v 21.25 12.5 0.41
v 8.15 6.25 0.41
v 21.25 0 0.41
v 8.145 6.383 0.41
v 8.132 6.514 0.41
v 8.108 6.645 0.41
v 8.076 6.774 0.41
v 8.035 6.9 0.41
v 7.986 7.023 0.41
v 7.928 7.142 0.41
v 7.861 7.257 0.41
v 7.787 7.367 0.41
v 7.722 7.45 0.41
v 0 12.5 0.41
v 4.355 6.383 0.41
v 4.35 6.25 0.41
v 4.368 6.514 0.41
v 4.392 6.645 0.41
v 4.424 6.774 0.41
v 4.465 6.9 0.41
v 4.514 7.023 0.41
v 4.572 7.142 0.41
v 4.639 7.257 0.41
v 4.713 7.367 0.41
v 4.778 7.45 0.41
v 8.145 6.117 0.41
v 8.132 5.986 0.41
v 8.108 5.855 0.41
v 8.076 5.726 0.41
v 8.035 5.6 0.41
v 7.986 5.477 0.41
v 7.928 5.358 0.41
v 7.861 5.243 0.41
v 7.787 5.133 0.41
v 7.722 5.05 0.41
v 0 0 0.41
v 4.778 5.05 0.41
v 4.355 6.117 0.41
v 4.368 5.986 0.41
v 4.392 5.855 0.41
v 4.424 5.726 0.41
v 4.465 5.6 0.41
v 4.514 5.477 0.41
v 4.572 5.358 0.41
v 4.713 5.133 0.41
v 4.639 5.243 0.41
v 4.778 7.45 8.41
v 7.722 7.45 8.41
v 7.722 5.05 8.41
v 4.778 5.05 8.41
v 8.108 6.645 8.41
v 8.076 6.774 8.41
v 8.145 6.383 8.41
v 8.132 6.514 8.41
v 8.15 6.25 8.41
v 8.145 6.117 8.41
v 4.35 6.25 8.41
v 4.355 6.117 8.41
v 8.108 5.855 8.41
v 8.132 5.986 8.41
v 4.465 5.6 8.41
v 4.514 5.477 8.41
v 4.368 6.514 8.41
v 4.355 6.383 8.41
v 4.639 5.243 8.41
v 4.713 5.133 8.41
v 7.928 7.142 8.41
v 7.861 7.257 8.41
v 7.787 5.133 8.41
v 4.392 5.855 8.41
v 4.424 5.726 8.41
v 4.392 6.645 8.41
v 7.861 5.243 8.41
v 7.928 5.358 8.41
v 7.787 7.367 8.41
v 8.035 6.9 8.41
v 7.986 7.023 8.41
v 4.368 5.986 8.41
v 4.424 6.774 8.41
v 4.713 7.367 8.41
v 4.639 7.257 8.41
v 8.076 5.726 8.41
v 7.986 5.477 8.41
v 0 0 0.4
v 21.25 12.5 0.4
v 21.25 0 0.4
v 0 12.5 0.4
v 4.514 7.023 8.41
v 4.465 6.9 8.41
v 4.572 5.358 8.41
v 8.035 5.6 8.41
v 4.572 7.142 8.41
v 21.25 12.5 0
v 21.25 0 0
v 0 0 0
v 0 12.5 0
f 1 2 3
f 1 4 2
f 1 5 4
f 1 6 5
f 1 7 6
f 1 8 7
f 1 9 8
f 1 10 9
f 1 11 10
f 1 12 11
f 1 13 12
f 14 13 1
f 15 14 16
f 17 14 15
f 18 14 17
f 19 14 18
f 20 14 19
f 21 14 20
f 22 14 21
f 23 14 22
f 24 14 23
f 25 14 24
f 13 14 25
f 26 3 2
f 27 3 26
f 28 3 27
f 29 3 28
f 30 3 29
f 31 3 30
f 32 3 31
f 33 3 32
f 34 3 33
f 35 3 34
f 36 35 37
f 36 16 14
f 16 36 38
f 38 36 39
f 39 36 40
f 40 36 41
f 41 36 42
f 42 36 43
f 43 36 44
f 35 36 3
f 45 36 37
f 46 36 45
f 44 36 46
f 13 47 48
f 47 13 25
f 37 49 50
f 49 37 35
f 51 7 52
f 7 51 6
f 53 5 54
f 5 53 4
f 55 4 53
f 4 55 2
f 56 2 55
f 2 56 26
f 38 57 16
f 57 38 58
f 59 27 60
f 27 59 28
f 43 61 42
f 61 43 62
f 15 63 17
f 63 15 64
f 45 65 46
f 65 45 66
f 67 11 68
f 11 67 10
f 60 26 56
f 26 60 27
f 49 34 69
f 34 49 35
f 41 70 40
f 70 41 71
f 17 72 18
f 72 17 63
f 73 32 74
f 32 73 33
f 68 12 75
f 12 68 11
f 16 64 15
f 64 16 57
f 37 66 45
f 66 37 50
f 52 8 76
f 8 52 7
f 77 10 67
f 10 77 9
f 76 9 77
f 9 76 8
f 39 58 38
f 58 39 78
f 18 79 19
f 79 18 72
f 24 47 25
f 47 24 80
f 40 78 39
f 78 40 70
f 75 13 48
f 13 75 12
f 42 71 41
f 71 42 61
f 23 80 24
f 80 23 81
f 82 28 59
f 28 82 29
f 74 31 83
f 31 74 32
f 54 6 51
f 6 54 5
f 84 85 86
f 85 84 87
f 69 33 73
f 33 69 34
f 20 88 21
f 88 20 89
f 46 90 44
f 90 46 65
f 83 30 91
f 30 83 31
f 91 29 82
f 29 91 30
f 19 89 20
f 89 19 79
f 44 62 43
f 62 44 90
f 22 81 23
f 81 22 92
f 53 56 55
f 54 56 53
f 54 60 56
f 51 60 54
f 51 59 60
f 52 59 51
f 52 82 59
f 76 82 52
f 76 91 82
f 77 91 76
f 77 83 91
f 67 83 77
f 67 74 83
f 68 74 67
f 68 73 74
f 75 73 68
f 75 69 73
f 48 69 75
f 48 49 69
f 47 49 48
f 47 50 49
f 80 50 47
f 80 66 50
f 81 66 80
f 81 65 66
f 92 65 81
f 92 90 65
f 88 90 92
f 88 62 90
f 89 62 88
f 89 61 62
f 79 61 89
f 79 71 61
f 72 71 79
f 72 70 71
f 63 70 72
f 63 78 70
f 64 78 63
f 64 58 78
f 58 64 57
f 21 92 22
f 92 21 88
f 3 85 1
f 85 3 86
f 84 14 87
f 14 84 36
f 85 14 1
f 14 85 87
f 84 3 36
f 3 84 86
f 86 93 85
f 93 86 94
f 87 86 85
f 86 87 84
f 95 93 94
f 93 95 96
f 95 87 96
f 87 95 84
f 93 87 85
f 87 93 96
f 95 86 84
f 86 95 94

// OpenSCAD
// file: ../../Base/Boxes.scad
// Fischertechnik Box Foundation
// Pre-designed Boxes

use <Constants.scad>

include <PlacementOptions.scad>

box190Width = 190;
box190Depth = 130;
box130Width = 130;
box130Depth = 95;

// Values are from an original ec3 box
topBottomDifference = 1.5;
outerHeight = 40;
baseThickness = 1.8;
innerHeight = outerHeight - baseThickness;
stackExcess = 5.7;
radius = 3.5;
wallThickness = 1.5;
tolerance = 0.2;

boxWallThickness = wallThickness;
boxBaseThickness = baseThickness;
boxWebWidth = 3.0;

// getBoxWallThickness()
// Gets the wall thickness of a Fischertechnik Box
function getBoxWallThickness() = boxWallThickness;

// getBoxUsageHeight(height = 38.2)
// Gets the usable height of a Fischertechnik box
// height = Outer height of the box from the bottom to the upper edge.
function getBoxUsageHeight(height = outerHeight) = height - baseThickness - stackExcess;

// getBoxInnerHeight()
// Gets the inner height of a Fischertechnik box, including the stack excess
function getBoxInnerHeight() = innerHeight;

// getBoxBaseThickness()
// Gets the thickness of the Fischertechnik box base.
function getBoxBaseThickness() = boxBaseThickness;

// getBoxWebWidth()
// Gets the width of a box web
function getBoxWebWidth() = boxWebWidth;

// getBox190Space()
// Gets the usable inner space of a Box 190 as an x/y-list
function getBox190Space() = [
    box190Width - 2*getBoxWallThickness() - topBottomDifference, 
    box190Depth - 2*getBoxWallThickness() - topBottomDifference ];

// RoundedCornerPlate(width, depth, height, radius)
// Creates a body plate with rounded corners for a box. Used
// also to create the complete box with the hull module.
// width = Width of the plate
// depth = depth of the plate 
// height = thickness of the plate
// radius = radius of the rounded corner
module RoundedCornerPlate(width, depth, height, radius) {
    translate([radius, radius])
    hull() {
        w = width-2*radius;
        d = depth-2*radius;
        cube([w, d, height]);
        cylinder(height, r=radius, $fn=getFragments());
        translate([w, 0])
            cylinder(height, r=radius, $fn=getFragments());
        translate([w, d])
            cylinder(height, r=radius, $fn=getFragments());
        translate([0, d])
            cylinder(height, r=radius, $fn=getFragments());
    }
}

// BoxBase(width, depth)
// Creates an empty stackable Fischertechnik compatible box
// width = Outer width of the box (190, 130, ...)
// depth = Outer depth of the box (130, 95, ...)

module BoxBase(width, depth, height=outerHeight) {    
    thinPlate = 0.01;

    innerHeight = height - baseThickness;    
    
    module Body(tolerance=tolerance) {
        hull() {
            // Bottom with tolerance to fit into the original boxes when stacked
            translate([-wallThickness+tolerance, -wallThickness+tolerance, -baseThickness])
                RoundedCornerPlate(width-topBottomDifference-2*tolerance, depth-topBottomDifference-2*tolerance, thinPlate, radius);
            
            // Top
            translate([-wallThickness-topBottomDifference/2, -wallThickness-topBottomDifference/2, innerHeight-thinPlate])
                RoundedCornerPlate(width, depth, thinPlate, radius);
         }
    }

    module Cutoff() {
        hull() {
            coWidth = width - 2*wallThickness;
            coDepth = depth - 2*wallThickness;
            
            // Bottom
            RoundedCornerPlate(coWidth-topBottomDifference, coDepth-topBottomDifference, thinPlate, radius);

            // Top
            translate([-topBottomDifference/2, -topBottomDifference/2, innerHeight+thinPlate]) 
                RoundedCornerPlate(coWidth, coDepth, thinPlate, radius);
        }
    }
    
    difference() {        
        Body();
        Cutoff();
        stackOffset = innerHeight - stackExcess;
        translate([0, 0, stackOffset + baseThickness])
            Body(tolerance=0);
    }
}

// Creates the Fischertechnik empty box 130x190 mm and places it at position 0,0
// 190x130 are the outer sizes, the inner space is slightly smaller. Use getBox190Space() to get the inner sizes.
// The box is positioned that the usable inner space is at the 0,0,0 position.

module Box190() {
    BoxBase(box190Width, box190Depth);
}

// Gets the usable inner space of a Box 130 as an x/y-list
function getBox130Space() = [
    box130Width - 2*getBoxWallThickness() - topBottomDifference, 
    box130Depth - 2*getBoxWallThickness() - topBottomDifference ];

// Creates the Fischertechnik empty box 95x130 mm and places it at position 0,0
// 190x130 are the outer sizes, the inner space is slightly smaller. Use getBox190Space() to get the inner sizes.
// The box is positioned that the usable inner space is at the 0,0,0 position.

module Box130() {
    BoxBase(box130Width, box130Depth);
}

// Creates a web at the specified box walls
// corner 0 = LowerLeft, 1 = UpperLeft, 2 = UpperRight, 3 = LowerRight
// side 0 = LeftOfCorner, 1 = RightOfCorner
// distance = Distance in mm from the corner
// boxSpace = inner width and depth of the box (default: Box 190)
// webWidth = length of the web (default is 3 mms)
// webThickness = thickness of the web (default is 1 mm)
// height = Height of the web (standard is getBoxUsageHeight())
// sink = How much of the web is sunk into the wall

module BoxWeb(
    corner, 
    side, 
    distance, 
    boxSpace=getBox190Space(), 
    webWidth=getBoxWebWidth(), 
    webThickness=1.0, 
    height=getBoxUsageHeight(),
    sink = getBoxWallThickness()/2) {
    width = (corner % 2 == 0) ? 
            (side == LeftOfCorner ? webWidth : webThickness) :
            (side == LeftOfCorner ? webThickness : webWidth);

    depth = (corner % 2 == 0) ? 
            (side == RightOfCorner ? webWidth : webThickness) :
            (side == RightOfCorner ? webThickness : webWidth);
    
    xDiff = corner == LowerLeft ? 
                (side == LeftOfCorner ? -sink : distance) :
            (corner == UpperLeft ?                
                (side == LeftOfCorner ? distance : -sink) :
            (corner == UpperRight ?
                (side == LeftOfCorner ? boxSpace.x-webWidth+sink : boxSpace.x-distance-webThickness) :
                (side == LeftOfCorner ? boxSpace.x-distance-webThickness: boxSpace.x-webWidth+sink)));

    yDiff = corner == LowerLeft ? 
                (side == RightOfCorner ? -sink : distance) :
            (corner == UpperLeft ?
                (side == RightOfCorner ? boxSpace.y-distance-webThickness : boxSpace.y-webWidth+sink) :
            (corner == UpperRight ?
                (side == RightOfCorner ? boxSpace.y-webWidth+sink : boxSpace.y-distance-webThickness) :
                (side == RightOfCorner ? distance : -sink)));
    
    translate([xDiff, yDiff, -getExcess()])
        cube([width, depth, height + 2*getExcess()]);
}
// file: ../../Base/Rotation.scad
// Fischertechnik Box Foundation
// Geometry Helpers Rotation

include <PlacementOptions.scad>

// getRotatedSpace(space, rotation=NoRotation)
// Rotates the space dependent on the specified rotation

function getRotatedSpace(space, rotation=NoRotation) = [
    (rotation == Rotate90 || rotation == Rotate270) ? space.y : space.x,
    (rotation == Rotate90 || rotation == Rotate270) ? space.x : space.y
];

// Rotates the given space around the fixed left lower corner
// space = the space the children needs as width/depth list [width,depth]
// rotation = 0 Rotate0 degrees, 1 Rotate90 degrees, 2 Rotate180 degrees, 3 Rotate270 degrees (equivalent to -90)

module RotateFix(space, rotation=NoRotation) {
    dy = (rotation == Rotate0 || rotation == Rotate270) ? 0 :
        (rotation == Rotate90) ? space.x :
        space.y;
    dx = (rotation < Rotate180) ? 0 :
        (rotation == Rotate180) ? space.x :
        space.y;
    
    translate([dx, dy, 0])
        rotate([0, 0, rotations[rotation]])
            children();
}
// file: ../../Base/Alignment.scad
// Fischertechnik Box Foundation
// Geometry Helpers Alignment

include <PlacementOptions.scad>

// getAlignedX(elementWidth, spaceWidth, align=AlignRight, offset=0)
// Gets the aligned X offset of an element with the given
// width in the given space.
// elementWidth = The width of the element to positon
// spaceWidth = The space where the element should be aligned
// align = 0 AlignLeft, 1 AlignCenter, 2 AlignRight
// offset = an optional offset from the aligned position. When
// aligned left or centered, then positive values are in X direction.
// When aligned right then positive values are in negative X direction.

function getAlignedX(elementWidth, spaceWidth, align=AlignRight, offset=0) =
    (align == AlignLeft) ?
        offset :
        ((align == AlignCenter) ?
        (spaceWidth - elementWidth)/2 + offset :
        spaceWidth - offset - elementWidth);

// getAlignedY(elementDepth, spaceDepth, align=AlignTop, offset=0)
// Gets the aligned Y offset of an element with the given
// depth in the given space.
// elementDepth = The depth of the element to positon
// spaceDepth = The space where the element should be aligned
// align = 0 AlignBottom, 1 AlignCenter, 2 AlignTop
// offset = an optional offset from the aligned position. When
// aligned bottom or centered, then positive values are in Y direction.
// When aligned top then positive values are in negative Y direction.

function getAlignedY(elementDepth, spaceDepth, align=AlignTop, offset=0) =
    (align == AlignBottom) ?
        offset :
        ((align == AlignCenter) ?
        (spaceDepth - elementDepth)/2 + offset :
        spaceDepth - offset - elementDepth);
// file: ../../Base/PlacementOptions.scad
// Fischertechnik Box Foundation
// Placement Options

// Alignment
NoAlign = 0;
AlignLeft = 1;
AlignBottom = 2;
AlignCenter = 3;
AlignRight = 4;
AlignTop = 5;

// Element rotation degree steps
rotations = [0, -90, -180, -270];

// Rotation
NoRotation = 0;
Rotate0 = 0;
Rotate90 = 1;
Rotate180 = 2;
Rotate270 = 3;

// Docking (seen from above)
NoDock = -1;
DockLeft = 0;
DockTop = 1;
DockRight = 2;
DockCorner = 2;
DockBottom = 3;

// Web corners
LowerLeft = 0;
UpperLeft = 1;
UpperRight = 2;
LowerRight = 3;

// Web position relative to corner
LeftOfCorner = 0;
RightOfCorner = 1;

// Rails direction
Horizontal = true;
Vertical = false;
// file: ../../Base/Placement.scad
// Fischertechnik Box Foundation
// Geometry Helpers Placement

use <Constants.scad>
use <Alignment.scad>
use <Rotation.scad>
use <Boxes.scad>

include <PlacementOptions.scad>

// Place(x=0, y=0, elementSpace=[0,0], alignX=AlignLeft, alignY=AlignBottom, rotation=Rotate0, boxSpace=getBox190Space())
// Places the child at the specified position
// y = Y-Position. This is a relative position when an X aligment is specified.
// x = X-Position. This is a relative position when an Y aligment is specified.
// elementSpace = space of the element to be placed [x,y]
// alignX = -1=NoAlign, 0 AlignLeft, 1 AlignCenter, 3 AlignRight (elementSpace and boxSpace required!)
// alignY = -1=NoAlign, 2 AlignBottom, 1 AlignCenter, 4 AlignTop (elementSpace and boxSpace required!)
// rotation = 0 Rotate0 0 degrees, 1 Rotate90 90 degrees, 
// 2 Rotate180 180 degrees, 3 Rotate270 270 degrees (equivalent to -90)
// boxSpace = Inner space of the box where the placement occurs [x,y] - default is Box 190x130 inner space

module Place(x=0, y=0, elementSpace=[0,0], 
  alignX=AlignLeft, alignY=AlignBottom, 
  rotation=NoRotation, boxSpace=getBox190Space()) {

    module Position(x, y, space, rotation=Rotate0) {
        translate([x, y, 0])
            RotateFix(space, rotation)
                children();
    }

    space = getRotatedSpace(elementSpace, rotation);
    alignedX = getAlignedX(space.x, boxSpace.x, alignX, x);
    alignedY = getAlignedY(space.y, boxSpace.y, alignY, y);
    Position(alignedX, alignedY, elementSpace, rotation)
        children();
}

// Center(space=getBox130Space(), elementSpace=[0,0])
// space = Space where the children is centered. For cylinder use centered=true and no elementSpace.
// elementSpace = space of the element to be centered [x,y]

module Center(space=getBox190Space(), elementSpace=[0,0]) {
    Place(elementSpace=elementSpace, boxSpace=space, alignX=AlignCenter, alignY=AlignCenter)
        children();
}

// CenterHorizontal(width=0, y=0, offset=0, space=getBox130Space())
// width = Width of the element to be placed.
// y = Y position of the element
// offset = Offset from the center position (negative will be left of the center)
// space = Space where the element is placed

module CenterHorizontal(width=0, y=0, offset=0, space=getBox190Space()) {
    Place(x=offset, y=y, elementSpace=[width, 0], boxSpace=space, alignX=AlignCenter)
        children(0);
}

// CenterVertical(depth=0, x=0, offset=0, space=getBox130Space())
// depth = Depth of the element to be placed.
// x = X position of the element
// offset = Offset from the center position (negative will be down of the center)
// space = Space where the element is placed

module CenterVertical(depth=0, x=0, offset=0, space=getBox190Space()) {
    Place(x=x, y=offset, elementSpace=[0, depth], boxSpace=space, alignY=AlignCenter)
        children(0);
}

// getIsVertical(align)
// True if the specified alignment needs a vertical orientation for a divider (AlignRight, AlignLeft)

function getIsVertical(align) = (align == AlignRight || align == AlignLeft);

// getIsHorizontal(align)
// True if the specified alignment needs a horizontal orientation for a divider (AlignTop, AlignBottom)

function getIsHorizontal(align) = (align == AlignTop || align == AlignBottom);
// file: ../../Elements/AxisClip10.scad
// Fischertechnik Box Library
// Axis for clip 10
// 31023

use <../ModelBase/Simple.scad>
use <../Base/Constants.scad>

/* [Element Parameters] */
height = 23;
clipHeight = 10;

/* [Hidden] */
width = 12;
depth = 12;
upperDiameter = 3.6;

// getAxisClip10Space()
// Gets the space of a n axis for a clip 10 with spring ring (mot2)

function getAxisClip10Space() = [width, depth, height];

// AxisClip10(height, clipHeight)
// Axis for clip 10 with spring ring (mot2)
// height = Height of the complete axis (standard is 23, in mot3 its only 12)
// clipHeight = Height of the part for the clip (standard is 10, in mot3 its only 7)

module AxisClip10(height=height, clipHeight=clipHeight) {
    LeveledAxisWithSpace(height, height-clipHeight, getAxisClip10Space(), diameter=upperDiameter);
}

// Test
color("lightgray")
AxisClip10(height, clipHeight);
// file: ../../Base/Constants.scad
// Fischertechnik Box Foundation
// Constants

// Constant values necessary for multiple elements

// Base constants
dividerThickness = 1.2;
excess = 0.01;
fragments = 90;
tolerance = 0.8;

// Gets the thickness of a divider 
function getDividerThickness() = dividerThickness;

// Gets the excess that is used to merge walls into each other
function getExcess() = excess;

// Gets amount of fragments of a cylinder
function getFragments() = fragments;

// Gets the inner tolerance of a frame to each side
function getTolerance() = tolerance;


// Fischertechnik specific constants
axisDiameter = 4;
axisBottomDiameter = axisDiameter + 1;
axisTolerance = 0.2;
axisLockingLength = 8;

// Gets axis diameter of Fischertechnik axis
function getAxisDiameter() = axisDiameter;

// Gets axis diameter tolerance (subtracted for element axis)
function getAxisTolerance() = axisTolerance;

// Gets the axis diameter for standing axis
function getStandAxisDiameter() = getAxisDiameter() - getAxisTolerance();

// Gets axis bottom diameter for thicker part at the bottom
function getAxisBottomDiameter() = axisBottomDiameter;

// Gets the lengthh of the locking part of a locking axis
function getAxisLockingLength() = axisLockingLength;

pinHeight = 2.5;
pinTolerance = 0.2;

// gets the height of a connecting pin
function getPinHeight() = pinHeight;

// gets the connecting pin height tolerance
function getPinTolerance() = pinTolerance;

standardEdgeDistance = 2.5;
standardWebDistance = 11.5;
standardCornerLength = 15;

// gets the standard distance to the wall of the box for dockable frames with webs
function getStandardEdgeDistance() = standardEdgeDistance;

// gets the standard distance of each web to the corner of the dockable frame
function getStandardWebDistance() = standardWebDistance;

// gets the standard length of the corner walls of a dockable frame
function getStandardCornerLength() = standardCornerLength;

tubeWallFactor = 0.8;

// gets the wall thickness of a tube.
function getTubeWallThickness() = tubeWallFactor * getDividerThickness();

smallPartsFrameHeight = 20;

// gets the frame height for docked small parts boxes.
function getSmallPartsFrameHeight() = smallPartsFrameHeight;

hubRingDiameter = 19.5;
hubRingLevelDiameter = 21;

// gets the diameter of a tube matching the inner ring of a wheel
function getHubRingDiameter() = hubRingDiameter;

// gets the diameter of a hub tube with a thicker diameter
function getHubRingLevelDiameter() = hubRingLevelDiameter;
// file: ../../Elements/AxisLockingCrank.scad
// Fischertechnik Box Library
// Axis for Locking Crank
// 35088

use <../Base/Placement.scad>
use <../ModelBase/Simple.scad>

include <../Base/PlacementOptions.scad>

/* [Hidden] */
depth = 12.5;
width = depth/2 + 15;

// getAxisLockingCrankSpace()
// Gets the space the locking crank needs

function getAxisLockingCrankSpace() = [width, depth];

// AxisLockingGear10()
// Standing locking axis for locking crank.

module AxisLockingCrank() {
    space = [width, depth];
    Space(space);
    Place(x=depth/2, alignY=AlignCenter, boxSpace=space)
        LockingAxis();
}

// Tests
color("lightgray")
AxisLockingCrank();
// file: ../TestPrint.scad
// 3D Print Test Base

use <../Base/Constants.scad>

use <../Elements/AxisClip10.scad>

module TestPrint(elementSpace) {
    cube([elementSpace.x, elementSpace.y, 0.4]);
    translate([0,0,0.4+getExcess()]) {
        children();
    }
}

TestPrint(getAxisClip10Space())
    AxisClip10();
// main file
// 3D Print Test
// AxisLockingCrank

use <../TestPrint.scad>
use <../../Elements/AxisLockingCrank.scad>

TestPrint(getAxisLockingCrankSpace())
    AxisLockingCrank();
